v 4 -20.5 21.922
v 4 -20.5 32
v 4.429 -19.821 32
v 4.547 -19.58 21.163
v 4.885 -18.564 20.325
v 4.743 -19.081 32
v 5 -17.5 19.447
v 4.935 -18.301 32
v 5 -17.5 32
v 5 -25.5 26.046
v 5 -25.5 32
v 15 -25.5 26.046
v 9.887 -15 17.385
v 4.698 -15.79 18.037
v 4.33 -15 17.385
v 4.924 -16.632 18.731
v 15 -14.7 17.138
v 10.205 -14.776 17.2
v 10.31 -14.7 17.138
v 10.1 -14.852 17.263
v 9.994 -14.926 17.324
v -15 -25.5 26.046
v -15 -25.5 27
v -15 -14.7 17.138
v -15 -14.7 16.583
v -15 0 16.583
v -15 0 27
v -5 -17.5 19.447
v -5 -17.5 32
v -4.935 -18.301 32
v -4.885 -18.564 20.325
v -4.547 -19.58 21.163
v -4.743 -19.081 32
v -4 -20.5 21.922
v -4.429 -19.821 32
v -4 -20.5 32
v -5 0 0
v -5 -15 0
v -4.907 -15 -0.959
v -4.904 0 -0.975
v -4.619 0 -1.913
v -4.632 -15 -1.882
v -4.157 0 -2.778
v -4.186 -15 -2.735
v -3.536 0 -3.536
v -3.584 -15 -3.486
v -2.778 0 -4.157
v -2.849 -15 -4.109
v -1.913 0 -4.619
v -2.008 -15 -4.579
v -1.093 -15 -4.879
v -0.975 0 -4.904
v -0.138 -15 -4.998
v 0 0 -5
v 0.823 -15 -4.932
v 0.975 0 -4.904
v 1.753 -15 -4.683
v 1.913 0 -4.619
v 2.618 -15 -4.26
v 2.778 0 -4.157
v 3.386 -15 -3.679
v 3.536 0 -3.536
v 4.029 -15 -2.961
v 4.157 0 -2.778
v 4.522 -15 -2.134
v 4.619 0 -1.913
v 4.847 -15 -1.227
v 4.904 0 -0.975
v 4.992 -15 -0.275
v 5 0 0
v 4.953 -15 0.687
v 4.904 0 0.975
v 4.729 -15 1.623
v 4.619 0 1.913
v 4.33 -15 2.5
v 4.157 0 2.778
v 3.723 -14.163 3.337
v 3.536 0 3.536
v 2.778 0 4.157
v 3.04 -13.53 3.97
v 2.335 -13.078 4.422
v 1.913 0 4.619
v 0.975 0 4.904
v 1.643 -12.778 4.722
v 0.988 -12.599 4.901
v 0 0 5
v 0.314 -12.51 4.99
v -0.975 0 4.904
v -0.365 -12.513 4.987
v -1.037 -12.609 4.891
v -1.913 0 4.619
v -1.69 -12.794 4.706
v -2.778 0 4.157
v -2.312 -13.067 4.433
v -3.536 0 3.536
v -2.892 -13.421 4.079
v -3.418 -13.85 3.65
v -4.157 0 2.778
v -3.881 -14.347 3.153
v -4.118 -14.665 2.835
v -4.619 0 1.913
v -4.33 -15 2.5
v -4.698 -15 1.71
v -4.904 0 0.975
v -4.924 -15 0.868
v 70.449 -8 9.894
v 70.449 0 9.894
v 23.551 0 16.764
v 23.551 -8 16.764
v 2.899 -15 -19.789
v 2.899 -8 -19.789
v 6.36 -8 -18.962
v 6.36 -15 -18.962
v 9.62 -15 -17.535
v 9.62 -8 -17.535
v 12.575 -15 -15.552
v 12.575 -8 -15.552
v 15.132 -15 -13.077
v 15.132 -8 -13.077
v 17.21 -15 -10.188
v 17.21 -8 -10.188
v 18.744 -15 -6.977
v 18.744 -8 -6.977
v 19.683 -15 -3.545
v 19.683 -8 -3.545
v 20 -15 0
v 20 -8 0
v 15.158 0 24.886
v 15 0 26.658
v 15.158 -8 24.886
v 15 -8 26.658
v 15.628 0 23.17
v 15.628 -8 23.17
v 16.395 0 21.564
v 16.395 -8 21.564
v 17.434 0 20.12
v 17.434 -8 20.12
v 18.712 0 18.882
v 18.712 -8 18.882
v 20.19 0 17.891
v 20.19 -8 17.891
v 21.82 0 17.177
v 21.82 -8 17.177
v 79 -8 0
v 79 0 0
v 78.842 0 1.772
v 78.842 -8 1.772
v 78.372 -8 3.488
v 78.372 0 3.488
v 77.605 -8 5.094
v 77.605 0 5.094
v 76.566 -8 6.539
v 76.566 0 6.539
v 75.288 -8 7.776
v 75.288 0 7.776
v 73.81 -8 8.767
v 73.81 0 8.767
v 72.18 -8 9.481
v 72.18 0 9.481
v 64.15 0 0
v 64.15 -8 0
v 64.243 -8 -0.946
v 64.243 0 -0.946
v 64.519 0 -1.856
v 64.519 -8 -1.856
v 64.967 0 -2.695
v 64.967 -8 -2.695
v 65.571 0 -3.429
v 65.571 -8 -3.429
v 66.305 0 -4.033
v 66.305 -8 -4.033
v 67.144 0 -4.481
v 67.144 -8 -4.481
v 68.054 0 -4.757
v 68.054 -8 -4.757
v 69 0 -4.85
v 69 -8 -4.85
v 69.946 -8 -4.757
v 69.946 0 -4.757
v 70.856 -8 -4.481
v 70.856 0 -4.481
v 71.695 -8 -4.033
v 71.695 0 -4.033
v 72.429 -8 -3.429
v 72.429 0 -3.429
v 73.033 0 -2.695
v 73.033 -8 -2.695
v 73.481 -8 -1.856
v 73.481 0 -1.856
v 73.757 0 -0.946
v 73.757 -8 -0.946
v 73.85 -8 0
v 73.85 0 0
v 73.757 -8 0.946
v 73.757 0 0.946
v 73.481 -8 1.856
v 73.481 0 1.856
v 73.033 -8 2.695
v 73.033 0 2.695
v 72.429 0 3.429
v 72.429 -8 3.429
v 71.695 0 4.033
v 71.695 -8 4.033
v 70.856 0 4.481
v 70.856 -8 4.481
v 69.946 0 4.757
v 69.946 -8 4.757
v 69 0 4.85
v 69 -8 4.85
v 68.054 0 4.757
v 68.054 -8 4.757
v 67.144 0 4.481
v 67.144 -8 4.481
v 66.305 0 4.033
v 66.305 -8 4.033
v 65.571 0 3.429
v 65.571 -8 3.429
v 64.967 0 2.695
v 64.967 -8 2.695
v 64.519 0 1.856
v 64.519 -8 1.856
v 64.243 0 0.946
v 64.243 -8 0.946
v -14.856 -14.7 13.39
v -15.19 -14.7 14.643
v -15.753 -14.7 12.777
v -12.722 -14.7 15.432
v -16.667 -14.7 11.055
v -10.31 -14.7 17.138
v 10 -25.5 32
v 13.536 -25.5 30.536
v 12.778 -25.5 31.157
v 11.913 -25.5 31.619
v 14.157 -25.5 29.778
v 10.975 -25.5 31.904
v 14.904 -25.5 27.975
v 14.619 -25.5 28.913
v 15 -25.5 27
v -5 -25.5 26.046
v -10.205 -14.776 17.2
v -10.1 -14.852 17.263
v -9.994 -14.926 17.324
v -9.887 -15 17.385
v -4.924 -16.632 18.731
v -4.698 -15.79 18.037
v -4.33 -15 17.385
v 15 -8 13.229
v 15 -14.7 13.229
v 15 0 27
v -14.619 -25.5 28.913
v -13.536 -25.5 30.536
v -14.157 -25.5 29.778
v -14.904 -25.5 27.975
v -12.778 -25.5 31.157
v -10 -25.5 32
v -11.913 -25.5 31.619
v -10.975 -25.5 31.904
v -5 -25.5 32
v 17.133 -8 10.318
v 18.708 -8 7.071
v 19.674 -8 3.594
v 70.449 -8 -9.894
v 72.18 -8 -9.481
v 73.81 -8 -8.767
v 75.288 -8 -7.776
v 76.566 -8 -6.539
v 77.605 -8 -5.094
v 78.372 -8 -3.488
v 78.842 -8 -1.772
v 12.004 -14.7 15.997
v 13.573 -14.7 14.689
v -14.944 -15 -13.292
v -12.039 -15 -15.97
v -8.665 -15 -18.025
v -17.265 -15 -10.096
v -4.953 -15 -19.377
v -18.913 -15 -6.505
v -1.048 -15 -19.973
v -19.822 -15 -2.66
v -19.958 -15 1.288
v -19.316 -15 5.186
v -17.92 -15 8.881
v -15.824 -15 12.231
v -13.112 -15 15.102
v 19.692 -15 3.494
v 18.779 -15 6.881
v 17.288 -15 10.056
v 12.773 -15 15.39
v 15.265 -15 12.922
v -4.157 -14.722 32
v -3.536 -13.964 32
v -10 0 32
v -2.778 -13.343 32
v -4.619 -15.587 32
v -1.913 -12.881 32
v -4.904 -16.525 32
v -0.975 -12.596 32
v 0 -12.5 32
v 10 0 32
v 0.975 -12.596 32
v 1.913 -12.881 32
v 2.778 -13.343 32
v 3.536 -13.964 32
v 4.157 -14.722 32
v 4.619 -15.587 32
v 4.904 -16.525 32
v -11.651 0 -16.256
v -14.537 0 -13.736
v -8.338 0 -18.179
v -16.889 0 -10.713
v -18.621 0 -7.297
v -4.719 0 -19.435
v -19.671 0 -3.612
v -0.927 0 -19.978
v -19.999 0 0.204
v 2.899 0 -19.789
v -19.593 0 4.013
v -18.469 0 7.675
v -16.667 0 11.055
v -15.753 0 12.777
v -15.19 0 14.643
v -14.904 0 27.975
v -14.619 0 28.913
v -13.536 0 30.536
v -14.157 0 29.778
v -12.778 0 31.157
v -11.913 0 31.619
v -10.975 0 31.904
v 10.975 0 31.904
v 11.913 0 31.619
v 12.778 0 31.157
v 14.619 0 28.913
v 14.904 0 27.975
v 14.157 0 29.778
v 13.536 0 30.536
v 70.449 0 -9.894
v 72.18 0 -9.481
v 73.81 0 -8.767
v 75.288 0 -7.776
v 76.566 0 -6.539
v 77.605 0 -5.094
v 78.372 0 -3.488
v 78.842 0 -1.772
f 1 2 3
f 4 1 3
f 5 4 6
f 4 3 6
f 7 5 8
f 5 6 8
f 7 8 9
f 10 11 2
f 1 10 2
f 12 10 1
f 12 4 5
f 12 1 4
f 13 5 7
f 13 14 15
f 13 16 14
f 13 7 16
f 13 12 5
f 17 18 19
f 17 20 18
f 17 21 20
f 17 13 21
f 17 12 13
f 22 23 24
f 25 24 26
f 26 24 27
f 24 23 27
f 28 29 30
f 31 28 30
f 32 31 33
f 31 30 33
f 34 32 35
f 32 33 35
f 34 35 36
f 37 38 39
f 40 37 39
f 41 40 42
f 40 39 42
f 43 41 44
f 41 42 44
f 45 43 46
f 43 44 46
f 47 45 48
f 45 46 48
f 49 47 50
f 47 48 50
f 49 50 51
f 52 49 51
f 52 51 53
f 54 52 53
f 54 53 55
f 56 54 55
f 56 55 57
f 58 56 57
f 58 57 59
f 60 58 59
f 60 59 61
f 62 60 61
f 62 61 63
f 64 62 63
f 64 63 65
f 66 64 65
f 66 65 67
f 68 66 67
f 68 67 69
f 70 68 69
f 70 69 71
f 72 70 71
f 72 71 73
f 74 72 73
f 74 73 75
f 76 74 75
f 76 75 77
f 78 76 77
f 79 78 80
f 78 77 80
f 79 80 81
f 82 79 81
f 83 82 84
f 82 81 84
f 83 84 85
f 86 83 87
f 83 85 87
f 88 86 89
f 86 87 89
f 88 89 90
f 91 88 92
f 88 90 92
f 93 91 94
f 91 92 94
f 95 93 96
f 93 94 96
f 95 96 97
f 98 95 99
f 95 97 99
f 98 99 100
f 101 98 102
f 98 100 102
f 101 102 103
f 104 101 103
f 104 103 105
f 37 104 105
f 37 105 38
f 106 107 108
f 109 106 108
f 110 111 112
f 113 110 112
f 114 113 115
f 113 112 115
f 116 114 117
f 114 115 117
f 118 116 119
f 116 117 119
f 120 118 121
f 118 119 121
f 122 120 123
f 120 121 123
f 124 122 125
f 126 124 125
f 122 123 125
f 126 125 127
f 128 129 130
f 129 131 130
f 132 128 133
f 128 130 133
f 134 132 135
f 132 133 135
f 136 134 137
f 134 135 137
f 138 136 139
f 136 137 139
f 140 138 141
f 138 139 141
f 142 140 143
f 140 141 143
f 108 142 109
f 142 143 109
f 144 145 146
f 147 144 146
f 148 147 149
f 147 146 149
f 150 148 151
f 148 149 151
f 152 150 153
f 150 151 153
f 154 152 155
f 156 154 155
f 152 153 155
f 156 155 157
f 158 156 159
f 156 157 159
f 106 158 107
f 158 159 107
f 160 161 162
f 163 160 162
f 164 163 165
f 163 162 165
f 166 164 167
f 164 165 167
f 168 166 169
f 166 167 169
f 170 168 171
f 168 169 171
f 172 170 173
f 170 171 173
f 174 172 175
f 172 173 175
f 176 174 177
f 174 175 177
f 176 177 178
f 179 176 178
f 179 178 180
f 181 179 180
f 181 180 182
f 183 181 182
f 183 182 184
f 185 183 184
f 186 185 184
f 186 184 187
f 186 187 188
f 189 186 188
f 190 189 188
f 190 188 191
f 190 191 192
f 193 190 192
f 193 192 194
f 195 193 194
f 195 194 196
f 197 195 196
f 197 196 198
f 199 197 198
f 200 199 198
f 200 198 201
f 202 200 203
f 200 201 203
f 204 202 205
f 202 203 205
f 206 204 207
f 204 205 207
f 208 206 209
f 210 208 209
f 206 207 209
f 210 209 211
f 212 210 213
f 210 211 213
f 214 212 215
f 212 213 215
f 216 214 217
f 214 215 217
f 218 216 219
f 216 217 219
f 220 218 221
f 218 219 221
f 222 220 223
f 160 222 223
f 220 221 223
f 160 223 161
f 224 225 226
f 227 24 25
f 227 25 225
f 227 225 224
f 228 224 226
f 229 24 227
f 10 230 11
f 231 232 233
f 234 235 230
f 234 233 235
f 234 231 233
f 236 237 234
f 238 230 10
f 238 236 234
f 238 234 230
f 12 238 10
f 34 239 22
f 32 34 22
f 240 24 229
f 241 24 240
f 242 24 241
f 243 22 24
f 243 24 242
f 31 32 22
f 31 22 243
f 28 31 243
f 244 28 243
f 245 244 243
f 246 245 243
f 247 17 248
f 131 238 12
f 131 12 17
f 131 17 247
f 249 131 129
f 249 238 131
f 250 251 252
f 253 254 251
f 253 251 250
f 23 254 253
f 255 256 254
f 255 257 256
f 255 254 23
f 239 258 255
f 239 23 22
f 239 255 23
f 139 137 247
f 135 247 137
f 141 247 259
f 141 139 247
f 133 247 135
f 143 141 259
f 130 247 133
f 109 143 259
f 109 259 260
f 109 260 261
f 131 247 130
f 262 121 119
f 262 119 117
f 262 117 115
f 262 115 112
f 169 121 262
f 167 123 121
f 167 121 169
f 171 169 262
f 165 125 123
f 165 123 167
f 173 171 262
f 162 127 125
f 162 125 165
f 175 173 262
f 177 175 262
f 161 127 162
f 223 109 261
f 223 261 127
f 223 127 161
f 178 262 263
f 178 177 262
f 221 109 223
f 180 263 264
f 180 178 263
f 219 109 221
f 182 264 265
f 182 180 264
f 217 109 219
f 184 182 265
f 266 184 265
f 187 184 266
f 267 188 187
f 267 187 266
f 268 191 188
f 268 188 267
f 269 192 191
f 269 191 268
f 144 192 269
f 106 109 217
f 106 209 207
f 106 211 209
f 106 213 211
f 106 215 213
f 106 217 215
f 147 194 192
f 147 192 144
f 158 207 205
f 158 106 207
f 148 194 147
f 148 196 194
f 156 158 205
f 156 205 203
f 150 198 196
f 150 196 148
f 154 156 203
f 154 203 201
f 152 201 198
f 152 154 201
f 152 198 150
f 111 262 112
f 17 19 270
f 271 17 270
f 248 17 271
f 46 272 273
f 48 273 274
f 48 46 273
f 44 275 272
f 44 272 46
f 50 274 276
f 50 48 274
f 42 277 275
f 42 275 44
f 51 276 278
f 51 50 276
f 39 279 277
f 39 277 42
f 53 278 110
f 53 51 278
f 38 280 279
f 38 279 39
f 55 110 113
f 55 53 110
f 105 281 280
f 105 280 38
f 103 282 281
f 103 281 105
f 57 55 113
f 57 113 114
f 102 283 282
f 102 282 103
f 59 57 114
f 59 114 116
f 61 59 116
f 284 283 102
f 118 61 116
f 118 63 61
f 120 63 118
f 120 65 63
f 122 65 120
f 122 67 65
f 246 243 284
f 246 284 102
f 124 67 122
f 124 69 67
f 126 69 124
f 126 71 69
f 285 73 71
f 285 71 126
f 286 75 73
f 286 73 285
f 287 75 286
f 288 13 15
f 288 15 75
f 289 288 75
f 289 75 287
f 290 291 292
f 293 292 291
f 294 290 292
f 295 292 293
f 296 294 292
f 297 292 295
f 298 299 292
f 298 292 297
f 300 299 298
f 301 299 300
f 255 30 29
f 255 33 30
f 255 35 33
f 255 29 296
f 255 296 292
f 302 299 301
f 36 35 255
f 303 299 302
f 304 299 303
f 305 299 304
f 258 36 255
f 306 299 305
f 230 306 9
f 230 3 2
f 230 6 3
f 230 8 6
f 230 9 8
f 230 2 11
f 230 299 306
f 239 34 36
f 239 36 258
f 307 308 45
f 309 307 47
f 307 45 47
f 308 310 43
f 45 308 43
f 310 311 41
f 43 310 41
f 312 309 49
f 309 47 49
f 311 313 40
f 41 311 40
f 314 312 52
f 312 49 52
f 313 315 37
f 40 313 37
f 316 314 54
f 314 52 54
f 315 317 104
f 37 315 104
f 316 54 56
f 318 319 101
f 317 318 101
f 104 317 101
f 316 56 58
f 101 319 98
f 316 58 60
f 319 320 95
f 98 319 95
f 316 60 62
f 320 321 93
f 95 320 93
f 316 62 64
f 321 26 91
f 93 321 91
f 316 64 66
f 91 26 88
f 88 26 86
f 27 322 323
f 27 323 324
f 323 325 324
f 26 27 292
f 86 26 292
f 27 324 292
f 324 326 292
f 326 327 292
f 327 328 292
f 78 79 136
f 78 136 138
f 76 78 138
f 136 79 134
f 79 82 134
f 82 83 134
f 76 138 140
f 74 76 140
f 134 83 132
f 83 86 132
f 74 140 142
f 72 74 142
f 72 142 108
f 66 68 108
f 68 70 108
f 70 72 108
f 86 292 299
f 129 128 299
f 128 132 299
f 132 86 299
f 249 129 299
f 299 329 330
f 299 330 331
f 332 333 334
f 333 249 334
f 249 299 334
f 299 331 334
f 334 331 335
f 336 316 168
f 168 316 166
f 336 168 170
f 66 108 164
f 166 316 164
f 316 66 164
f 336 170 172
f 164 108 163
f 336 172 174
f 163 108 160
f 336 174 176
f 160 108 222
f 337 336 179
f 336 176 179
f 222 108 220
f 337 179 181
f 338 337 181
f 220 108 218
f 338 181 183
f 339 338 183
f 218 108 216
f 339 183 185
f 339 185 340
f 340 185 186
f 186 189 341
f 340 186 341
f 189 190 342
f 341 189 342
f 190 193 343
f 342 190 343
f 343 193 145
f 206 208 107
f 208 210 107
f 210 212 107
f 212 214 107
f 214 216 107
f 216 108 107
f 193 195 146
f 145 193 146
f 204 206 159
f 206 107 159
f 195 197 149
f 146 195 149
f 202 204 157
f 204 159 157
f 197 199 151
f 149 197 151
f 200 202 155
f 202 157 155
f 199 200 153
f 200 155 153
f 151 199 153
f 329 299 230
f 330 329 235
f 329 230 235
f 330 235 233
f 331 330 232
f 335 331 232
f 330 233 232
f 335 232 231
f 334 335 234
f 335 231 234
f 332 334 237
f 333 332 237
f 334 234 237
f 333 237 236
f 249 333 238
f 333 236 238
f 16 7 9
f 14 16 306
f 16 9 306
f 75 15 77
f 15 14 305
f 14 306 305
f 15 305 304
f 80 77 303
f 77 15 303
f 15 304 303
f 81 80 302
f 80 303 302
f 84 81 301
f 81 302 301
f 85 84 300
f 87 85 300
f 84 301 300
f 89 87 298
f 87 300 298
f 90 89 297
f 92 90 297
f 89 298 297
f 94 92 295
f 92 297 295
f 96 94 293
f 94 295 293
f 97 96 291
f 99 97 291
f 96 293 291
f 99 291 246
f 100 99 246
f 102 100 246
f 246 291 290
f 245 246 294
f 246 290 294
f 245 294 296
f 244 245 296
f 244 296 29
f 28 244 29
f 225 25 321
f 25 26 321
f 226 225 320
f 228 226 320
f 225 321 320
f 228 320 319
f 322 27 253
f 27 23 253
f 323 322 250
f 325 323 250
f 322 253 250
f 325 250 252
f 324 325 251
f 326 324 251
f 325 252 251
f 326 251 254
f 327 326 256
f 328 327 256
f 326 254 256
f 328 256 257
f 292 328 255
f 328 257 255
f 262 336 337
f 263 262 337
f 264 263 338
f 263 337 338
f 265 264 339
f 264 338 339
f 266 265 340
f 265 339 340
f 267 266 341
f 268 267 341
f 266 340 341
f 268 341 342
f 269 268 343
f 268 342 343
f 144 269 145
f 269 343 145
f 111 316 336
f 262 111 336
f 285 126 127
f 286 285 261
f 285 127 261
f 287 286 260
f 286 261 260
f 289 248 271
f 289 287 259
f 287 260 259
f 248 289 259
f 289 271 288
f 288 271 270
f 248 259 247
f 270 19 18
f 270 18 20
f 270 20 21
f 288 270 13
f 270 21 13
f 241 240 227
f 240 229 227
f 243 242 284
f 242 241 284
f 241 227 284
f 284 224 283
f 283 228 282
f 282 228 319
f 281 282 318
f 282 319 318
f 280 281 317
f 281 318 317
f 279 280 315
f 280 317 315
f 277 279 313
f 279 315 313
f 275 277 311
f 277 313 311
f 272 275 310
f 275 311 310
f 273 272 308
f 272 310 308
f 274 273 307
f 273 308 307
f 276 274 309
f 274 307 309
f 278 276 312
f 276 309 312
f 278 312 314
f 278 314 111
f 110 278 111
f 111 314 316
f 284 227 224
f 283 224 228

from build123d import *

# Parameters (mm, degrees)
F1_DEPTH = 15
F2_DEPTH = 8
F4_DEPTH = 15
F5_D     = 9.7
F6_D     = 10
F8_DEPTH = 29.501
F9_R     = 5
F10_R    = 10


with BuildPart() as f1:
    # F0 (on Front) → F1 (new body)
    with BuildSketch(Plane.XZ):
        with BuildLine():
            ThreePointArc((2.8985507246, -19.7888454362), (15.1322670888, -13.0772509632), (20, 0))
            ThreePointArc((20, 0), (15.1322670888, 13.0772509632), (2.8985507246, 19.7888454362))
            ThreePointArc((2.8985507246, 19.7888454362), (-20, 0), (2.8985507246, -19.7888454362))
        make_face()
    extrude(amount=F1_DEPTH)

    # F0 (on Front) → F2 (join)
    with BuildSketch(Plane.XZ):
        with BuildLine():
            ThreePointArc((2.8985507246, 19.7888454362), (15.1322670888, 13.0772509632), (20, 0))
            ThreePointArc((20, 0), (15.1322670888, -13.0772509632), (2.8985507246, -19.7888454362))
            Line((2.8985507246, -19.7888454362), (70.4492753623, -9.8944227181))
            ThreePointArc((70.4492753623, -9.8944227181), (59, 0), (70.4492753623, 9.8944227181))
            Line((70.4492753623, 9.8944227181), (2.8985507246, 19.7888454362))
        make_face()
        with BuildLine():
            ThreePointArc((79, 0), (76.5661335444, 6.5386254816), (70.4492753623, 9.8944227181))
            ThreePointArc((70.4492753623, 9.8944227181), (59, 0), (70.4492753623, -9.8944227181))
            ThreePointArc((70.4492753623, -9.8944227181), (76.5661335444, -6.5386254816), (79, 0))
        make_face()
    extrude(amount=F2_DEPTH)

    # F3 (on Right) → F4 (join, symmetric)
    with BuildSketch(Plane.YZ):
        Polygon((-14.7, 0), (0, 0), (0, 32), (-25.5, 32), (-25.5, 26.0460784735), (-14.7, 17.137655493), align=None)
    extrude(amount=F4_DEPTH, both=True)

    # F5 (through all)
    with Locations(Plane(origin=(0, 0, 0), x_dir=(1, 0, 0), z_dir=(0, 1, 0))):
        with Locations((69, 0)):
            Hole(F5_D / 2)

    # F6 (through all)
    with Locations(Plane(origin=(0, 0, 0), x_dir=(1, 0, 0), z_dir=(0, 1, 0))):
        with Locations((0, 0)):
            Hole(F6_D / 2)

    # F7 (on face) → F8 (cut, through all)
    with BuildSketch(Plane.XY.offset(32)):
        with BuildLine():
            Line((-5, -25.5), (5, -25.5))
            Line((5, -25.5), (4, -20.5))
            ThreePointArc((4, -20.5), (4.7434164903, -19.0811388301), (5, -17.5))
            ThreePointArc((5, -17.5), (0, -12.5), (-5, -17.5))
            ThreePointArc((-5, -17.5), (-4.7434164903, -19.0811388301), (-4, -20.5))
            Line((-4, -20.5), (-5, -25.5))
        make_face()
    extrude(amount=-F8_DEPTH, mode=Mode.SUBTRACT)

    # F9
    f9_edges = [f1.edges().sort_by_distance(p)[0] for p in [
        (15, -12.75, 32),
        (-15, -12.75, 32),
    ]]
    fillet(f9_edges, radius=F9_R)

    # F10
    f10_edges = [f1.edges().sort_by_distance(p)[0] for p in [
        (15, -4, 18.016298),
        (-15, -7.35, 13.228757),
    ]]
    fillet(f10_edges, radius=F10_R)


solid = f1.part
